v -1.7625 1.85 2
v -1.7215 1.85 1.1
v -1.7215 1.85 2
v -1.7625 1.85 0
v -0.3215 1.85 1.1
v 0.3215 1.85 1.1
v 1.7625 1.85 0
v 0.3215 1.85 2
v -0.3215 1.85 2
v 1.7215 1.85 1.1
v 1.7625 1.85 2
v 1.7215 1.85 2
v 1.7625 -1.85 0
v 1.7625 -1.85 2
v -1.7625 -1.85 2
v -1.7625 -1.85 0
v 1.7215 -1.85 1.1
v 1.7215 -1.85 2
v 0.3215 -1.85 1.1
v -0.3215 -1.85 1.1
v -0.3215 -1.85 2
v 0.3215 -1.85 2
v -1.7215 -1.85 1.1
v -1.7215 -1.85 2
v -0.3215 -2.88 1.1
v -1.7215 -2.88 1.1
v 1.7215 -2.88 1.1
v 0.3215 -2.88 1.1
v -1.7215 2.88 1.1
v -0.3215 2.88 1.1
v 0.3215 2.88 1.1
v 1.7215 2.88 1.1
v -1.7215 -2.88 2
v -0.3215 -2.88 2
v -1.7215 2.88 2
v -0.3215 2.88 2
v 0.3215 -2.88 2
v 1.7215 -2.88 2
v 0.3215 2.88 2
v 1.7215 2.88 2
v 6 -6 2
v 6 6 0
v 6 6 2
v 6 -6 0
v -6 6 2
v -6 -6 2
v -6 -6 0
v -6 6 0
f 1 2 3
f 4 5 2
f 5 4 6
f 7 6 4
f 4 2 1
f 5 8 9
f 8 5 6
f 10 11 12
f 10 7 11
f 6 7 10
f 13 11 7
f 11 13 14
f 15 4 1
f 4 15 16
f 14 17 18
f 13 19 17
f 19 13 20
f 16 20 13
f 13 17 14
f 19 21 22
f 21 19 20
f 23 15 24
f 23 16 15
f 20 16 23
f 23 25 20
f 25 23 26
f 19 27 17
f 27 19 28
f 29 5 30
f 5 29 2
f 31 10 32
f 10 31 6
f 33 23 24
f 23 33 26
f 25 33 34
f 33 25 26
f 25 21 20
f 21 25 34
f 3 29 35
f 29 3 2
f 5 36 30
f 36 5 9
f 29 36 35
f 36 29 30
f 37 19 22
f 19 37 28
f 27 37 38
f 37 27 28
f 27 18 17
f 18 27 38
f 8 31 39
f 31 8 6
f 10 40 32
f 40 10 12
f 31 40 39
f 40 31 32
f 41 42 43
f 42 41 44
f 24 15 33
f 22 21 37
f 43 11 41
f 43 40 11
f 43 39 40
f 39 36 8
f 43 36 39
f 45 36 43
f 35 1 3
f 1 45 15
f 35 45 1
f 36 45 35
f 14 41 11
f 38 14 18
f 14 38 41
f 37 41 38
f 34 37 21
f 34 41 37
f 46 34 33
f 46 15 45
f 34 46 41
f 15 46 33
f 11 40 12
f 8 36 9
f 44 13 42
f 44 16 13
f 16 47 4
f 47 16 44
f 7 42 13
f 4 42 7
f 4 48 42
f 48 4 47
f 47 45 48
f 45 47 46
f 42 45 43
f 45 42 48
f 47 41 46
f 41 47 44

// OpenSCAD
//
//  Emitter footprint
//
//  Defines the 3D shape subtracted from the illuminator shell at each emitter position.
//  Replace with custom geometry as needed - this module is called once per emitter
//  inside neg___quiver with mode = "body". The shape is positioned and oriented
//  by emitter_transform before subtraction. Define it centered at the origin in XY
//  and extending along +Z, with z = shell_depth___mm landing on the outer shell
//  surface (the hemispherical shell mirrors the footprint outward through the wall).
//
//  Default footprint: rectangular LED body through-pocket with four solder pad
//  clearance pockets recessed into the outer surface.
//
//  The shell templates fetch this file via use <...>, so the standalone test
//  rendering at the bottom executes only when the file is opened directly.
//

/* [LED body] */
emitter_body_width___mm = 3.7;
emitter_body_height___mm = 3.525;
// extra cut beyond the outer surface, clears shell curvature under the body rectangle
emitter_body_surface_clearance___mm = 1.0;

/* [Solder pads] */
solder_pad_width___mm = 1.1;
solder_pad_height___mm = 1.4;
// outward offset of pad centers beyond the body half width
solder_pad_overhang_x___mm = 0.48;
// inward offset of pad centers from the body half height
solder_pad_inset_y___mm = 0.741;
// pocket depth into the outer surface
solder_pad_pocket_depth___mm = 0.9;
// extra cut beyond the outer surface, clears shell curvature under the pads
solder_pad_surface_clearance___mm = 0.2;

// exposes the body dimensions to files importing this footprint via use <...>
function emitter_body_size___mm() = [emitter_body_width___mm, emitter_body_height___mm];

module emitter_body_shape(
    width___mm = emitter_body_width___mm,
    height___mm = emitter_body_height___mm
) {
    square([width___mm, height___mm], center = true);
}

module solder_pad_shape(
    body_width___mm = emitter_body_width___mm,
    body_height___mm = emitter_body_height___mm
) {
    pad_center_offsets = [
        [-body_width___mm / 2 - solder_pad_overhang_x___mm, -body_height___mm / 2 + solder_pad_inset_y___mm],
        [-body_width___mm / 2 - solder_pad_overhang_x___mm,  body_height___mm / 2 - solder_pad_inset_y___mm],
        [ body_width___mm / 2 + solder_pad_overhang_x___mm, -body_height___mm / 2 + solder_pad_inset_y___mm],
        [ body_width___mm / 2 + solder_pad_overhang_x___mm,  body_height___mm / 2 - solder_pad_inset_y___mm]
    ];

    for (pad_center = pad_center_offsets)
        translate(pad_center)
            square([solder_pad_width___mm, solder_pad_height___mm], center = true);
}

module emitter_footprint(shell_depth___mm, eps = 0.01) {
    // LED body through-pocket
    translate([0, 0, -eps])
        linear_extrude(
            height = shell_depth___mm + emitter_body_surface_clearance___mm + 2 * eps,
            convexity = 8
        )
            rotate([0, 0, 90])
                emitter_body_shape();

    // solder pad clearance pockets recessed into the outer surface
    translate([0, 0, shell_depth___mm - solder_pad_pocket_depth___mm])
        linear_extrude(
            height = solder_pad_pocket_depth___mm + solder_pad_surface_clearance___mm,
            convexity = 8
        )
            rotate([0, 0, 90])
                solder_pad_shape();
}

//
//    STANDALONE TEST RENDERING
//

// demo slab with the footprint subtracted; not executed when this file is
// imported via use <...>
demo_shell_depth___mm = 2;
demo_slab_extent___mm = 12;

difference() {
    translate([-demo_slab_extent___mm / 2, -demo_slab_extent___mm / 2, 0])
        cube([demo_slab_extent___mm, demo_slab_extent___mm, demo_shell_depth___mm]);

    emitter_footprint(demo_shell_depth___mm);
}
